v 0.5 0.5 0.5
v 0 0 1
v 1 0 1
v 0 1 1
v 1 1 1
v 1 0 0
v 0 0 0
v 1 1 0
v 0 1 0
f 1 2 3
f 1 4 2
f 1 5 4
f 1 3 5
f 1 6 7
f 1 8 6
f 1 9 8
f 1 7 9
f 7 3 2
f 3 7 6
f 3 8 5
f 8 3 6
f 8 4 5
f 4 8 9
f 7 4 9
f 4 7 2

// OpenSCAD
polyhedron(
  points=[
    [0, 0, 0],
    [1, 0, 0],
    [0, 1, 0],
    [1, 1, 0],

    [0, 0, 1],
    [1, 0, 1],
    [0, 1, 1],
    [1, 1, 1],

    [0.5, 0.5, 0.5],
  ],
  faces=[
    [5,4,8],
    [4,6,8],
    [6,7,8],
    [7,5,8],
    
    [0,1,8],
    [1,3,8],
    [3,2,8],
    [2,0,8],
    
    [4,5,1,0],
    [5,7,3,1],
    [7,6,2,3],
    [6,4,0,2],
  ]);
